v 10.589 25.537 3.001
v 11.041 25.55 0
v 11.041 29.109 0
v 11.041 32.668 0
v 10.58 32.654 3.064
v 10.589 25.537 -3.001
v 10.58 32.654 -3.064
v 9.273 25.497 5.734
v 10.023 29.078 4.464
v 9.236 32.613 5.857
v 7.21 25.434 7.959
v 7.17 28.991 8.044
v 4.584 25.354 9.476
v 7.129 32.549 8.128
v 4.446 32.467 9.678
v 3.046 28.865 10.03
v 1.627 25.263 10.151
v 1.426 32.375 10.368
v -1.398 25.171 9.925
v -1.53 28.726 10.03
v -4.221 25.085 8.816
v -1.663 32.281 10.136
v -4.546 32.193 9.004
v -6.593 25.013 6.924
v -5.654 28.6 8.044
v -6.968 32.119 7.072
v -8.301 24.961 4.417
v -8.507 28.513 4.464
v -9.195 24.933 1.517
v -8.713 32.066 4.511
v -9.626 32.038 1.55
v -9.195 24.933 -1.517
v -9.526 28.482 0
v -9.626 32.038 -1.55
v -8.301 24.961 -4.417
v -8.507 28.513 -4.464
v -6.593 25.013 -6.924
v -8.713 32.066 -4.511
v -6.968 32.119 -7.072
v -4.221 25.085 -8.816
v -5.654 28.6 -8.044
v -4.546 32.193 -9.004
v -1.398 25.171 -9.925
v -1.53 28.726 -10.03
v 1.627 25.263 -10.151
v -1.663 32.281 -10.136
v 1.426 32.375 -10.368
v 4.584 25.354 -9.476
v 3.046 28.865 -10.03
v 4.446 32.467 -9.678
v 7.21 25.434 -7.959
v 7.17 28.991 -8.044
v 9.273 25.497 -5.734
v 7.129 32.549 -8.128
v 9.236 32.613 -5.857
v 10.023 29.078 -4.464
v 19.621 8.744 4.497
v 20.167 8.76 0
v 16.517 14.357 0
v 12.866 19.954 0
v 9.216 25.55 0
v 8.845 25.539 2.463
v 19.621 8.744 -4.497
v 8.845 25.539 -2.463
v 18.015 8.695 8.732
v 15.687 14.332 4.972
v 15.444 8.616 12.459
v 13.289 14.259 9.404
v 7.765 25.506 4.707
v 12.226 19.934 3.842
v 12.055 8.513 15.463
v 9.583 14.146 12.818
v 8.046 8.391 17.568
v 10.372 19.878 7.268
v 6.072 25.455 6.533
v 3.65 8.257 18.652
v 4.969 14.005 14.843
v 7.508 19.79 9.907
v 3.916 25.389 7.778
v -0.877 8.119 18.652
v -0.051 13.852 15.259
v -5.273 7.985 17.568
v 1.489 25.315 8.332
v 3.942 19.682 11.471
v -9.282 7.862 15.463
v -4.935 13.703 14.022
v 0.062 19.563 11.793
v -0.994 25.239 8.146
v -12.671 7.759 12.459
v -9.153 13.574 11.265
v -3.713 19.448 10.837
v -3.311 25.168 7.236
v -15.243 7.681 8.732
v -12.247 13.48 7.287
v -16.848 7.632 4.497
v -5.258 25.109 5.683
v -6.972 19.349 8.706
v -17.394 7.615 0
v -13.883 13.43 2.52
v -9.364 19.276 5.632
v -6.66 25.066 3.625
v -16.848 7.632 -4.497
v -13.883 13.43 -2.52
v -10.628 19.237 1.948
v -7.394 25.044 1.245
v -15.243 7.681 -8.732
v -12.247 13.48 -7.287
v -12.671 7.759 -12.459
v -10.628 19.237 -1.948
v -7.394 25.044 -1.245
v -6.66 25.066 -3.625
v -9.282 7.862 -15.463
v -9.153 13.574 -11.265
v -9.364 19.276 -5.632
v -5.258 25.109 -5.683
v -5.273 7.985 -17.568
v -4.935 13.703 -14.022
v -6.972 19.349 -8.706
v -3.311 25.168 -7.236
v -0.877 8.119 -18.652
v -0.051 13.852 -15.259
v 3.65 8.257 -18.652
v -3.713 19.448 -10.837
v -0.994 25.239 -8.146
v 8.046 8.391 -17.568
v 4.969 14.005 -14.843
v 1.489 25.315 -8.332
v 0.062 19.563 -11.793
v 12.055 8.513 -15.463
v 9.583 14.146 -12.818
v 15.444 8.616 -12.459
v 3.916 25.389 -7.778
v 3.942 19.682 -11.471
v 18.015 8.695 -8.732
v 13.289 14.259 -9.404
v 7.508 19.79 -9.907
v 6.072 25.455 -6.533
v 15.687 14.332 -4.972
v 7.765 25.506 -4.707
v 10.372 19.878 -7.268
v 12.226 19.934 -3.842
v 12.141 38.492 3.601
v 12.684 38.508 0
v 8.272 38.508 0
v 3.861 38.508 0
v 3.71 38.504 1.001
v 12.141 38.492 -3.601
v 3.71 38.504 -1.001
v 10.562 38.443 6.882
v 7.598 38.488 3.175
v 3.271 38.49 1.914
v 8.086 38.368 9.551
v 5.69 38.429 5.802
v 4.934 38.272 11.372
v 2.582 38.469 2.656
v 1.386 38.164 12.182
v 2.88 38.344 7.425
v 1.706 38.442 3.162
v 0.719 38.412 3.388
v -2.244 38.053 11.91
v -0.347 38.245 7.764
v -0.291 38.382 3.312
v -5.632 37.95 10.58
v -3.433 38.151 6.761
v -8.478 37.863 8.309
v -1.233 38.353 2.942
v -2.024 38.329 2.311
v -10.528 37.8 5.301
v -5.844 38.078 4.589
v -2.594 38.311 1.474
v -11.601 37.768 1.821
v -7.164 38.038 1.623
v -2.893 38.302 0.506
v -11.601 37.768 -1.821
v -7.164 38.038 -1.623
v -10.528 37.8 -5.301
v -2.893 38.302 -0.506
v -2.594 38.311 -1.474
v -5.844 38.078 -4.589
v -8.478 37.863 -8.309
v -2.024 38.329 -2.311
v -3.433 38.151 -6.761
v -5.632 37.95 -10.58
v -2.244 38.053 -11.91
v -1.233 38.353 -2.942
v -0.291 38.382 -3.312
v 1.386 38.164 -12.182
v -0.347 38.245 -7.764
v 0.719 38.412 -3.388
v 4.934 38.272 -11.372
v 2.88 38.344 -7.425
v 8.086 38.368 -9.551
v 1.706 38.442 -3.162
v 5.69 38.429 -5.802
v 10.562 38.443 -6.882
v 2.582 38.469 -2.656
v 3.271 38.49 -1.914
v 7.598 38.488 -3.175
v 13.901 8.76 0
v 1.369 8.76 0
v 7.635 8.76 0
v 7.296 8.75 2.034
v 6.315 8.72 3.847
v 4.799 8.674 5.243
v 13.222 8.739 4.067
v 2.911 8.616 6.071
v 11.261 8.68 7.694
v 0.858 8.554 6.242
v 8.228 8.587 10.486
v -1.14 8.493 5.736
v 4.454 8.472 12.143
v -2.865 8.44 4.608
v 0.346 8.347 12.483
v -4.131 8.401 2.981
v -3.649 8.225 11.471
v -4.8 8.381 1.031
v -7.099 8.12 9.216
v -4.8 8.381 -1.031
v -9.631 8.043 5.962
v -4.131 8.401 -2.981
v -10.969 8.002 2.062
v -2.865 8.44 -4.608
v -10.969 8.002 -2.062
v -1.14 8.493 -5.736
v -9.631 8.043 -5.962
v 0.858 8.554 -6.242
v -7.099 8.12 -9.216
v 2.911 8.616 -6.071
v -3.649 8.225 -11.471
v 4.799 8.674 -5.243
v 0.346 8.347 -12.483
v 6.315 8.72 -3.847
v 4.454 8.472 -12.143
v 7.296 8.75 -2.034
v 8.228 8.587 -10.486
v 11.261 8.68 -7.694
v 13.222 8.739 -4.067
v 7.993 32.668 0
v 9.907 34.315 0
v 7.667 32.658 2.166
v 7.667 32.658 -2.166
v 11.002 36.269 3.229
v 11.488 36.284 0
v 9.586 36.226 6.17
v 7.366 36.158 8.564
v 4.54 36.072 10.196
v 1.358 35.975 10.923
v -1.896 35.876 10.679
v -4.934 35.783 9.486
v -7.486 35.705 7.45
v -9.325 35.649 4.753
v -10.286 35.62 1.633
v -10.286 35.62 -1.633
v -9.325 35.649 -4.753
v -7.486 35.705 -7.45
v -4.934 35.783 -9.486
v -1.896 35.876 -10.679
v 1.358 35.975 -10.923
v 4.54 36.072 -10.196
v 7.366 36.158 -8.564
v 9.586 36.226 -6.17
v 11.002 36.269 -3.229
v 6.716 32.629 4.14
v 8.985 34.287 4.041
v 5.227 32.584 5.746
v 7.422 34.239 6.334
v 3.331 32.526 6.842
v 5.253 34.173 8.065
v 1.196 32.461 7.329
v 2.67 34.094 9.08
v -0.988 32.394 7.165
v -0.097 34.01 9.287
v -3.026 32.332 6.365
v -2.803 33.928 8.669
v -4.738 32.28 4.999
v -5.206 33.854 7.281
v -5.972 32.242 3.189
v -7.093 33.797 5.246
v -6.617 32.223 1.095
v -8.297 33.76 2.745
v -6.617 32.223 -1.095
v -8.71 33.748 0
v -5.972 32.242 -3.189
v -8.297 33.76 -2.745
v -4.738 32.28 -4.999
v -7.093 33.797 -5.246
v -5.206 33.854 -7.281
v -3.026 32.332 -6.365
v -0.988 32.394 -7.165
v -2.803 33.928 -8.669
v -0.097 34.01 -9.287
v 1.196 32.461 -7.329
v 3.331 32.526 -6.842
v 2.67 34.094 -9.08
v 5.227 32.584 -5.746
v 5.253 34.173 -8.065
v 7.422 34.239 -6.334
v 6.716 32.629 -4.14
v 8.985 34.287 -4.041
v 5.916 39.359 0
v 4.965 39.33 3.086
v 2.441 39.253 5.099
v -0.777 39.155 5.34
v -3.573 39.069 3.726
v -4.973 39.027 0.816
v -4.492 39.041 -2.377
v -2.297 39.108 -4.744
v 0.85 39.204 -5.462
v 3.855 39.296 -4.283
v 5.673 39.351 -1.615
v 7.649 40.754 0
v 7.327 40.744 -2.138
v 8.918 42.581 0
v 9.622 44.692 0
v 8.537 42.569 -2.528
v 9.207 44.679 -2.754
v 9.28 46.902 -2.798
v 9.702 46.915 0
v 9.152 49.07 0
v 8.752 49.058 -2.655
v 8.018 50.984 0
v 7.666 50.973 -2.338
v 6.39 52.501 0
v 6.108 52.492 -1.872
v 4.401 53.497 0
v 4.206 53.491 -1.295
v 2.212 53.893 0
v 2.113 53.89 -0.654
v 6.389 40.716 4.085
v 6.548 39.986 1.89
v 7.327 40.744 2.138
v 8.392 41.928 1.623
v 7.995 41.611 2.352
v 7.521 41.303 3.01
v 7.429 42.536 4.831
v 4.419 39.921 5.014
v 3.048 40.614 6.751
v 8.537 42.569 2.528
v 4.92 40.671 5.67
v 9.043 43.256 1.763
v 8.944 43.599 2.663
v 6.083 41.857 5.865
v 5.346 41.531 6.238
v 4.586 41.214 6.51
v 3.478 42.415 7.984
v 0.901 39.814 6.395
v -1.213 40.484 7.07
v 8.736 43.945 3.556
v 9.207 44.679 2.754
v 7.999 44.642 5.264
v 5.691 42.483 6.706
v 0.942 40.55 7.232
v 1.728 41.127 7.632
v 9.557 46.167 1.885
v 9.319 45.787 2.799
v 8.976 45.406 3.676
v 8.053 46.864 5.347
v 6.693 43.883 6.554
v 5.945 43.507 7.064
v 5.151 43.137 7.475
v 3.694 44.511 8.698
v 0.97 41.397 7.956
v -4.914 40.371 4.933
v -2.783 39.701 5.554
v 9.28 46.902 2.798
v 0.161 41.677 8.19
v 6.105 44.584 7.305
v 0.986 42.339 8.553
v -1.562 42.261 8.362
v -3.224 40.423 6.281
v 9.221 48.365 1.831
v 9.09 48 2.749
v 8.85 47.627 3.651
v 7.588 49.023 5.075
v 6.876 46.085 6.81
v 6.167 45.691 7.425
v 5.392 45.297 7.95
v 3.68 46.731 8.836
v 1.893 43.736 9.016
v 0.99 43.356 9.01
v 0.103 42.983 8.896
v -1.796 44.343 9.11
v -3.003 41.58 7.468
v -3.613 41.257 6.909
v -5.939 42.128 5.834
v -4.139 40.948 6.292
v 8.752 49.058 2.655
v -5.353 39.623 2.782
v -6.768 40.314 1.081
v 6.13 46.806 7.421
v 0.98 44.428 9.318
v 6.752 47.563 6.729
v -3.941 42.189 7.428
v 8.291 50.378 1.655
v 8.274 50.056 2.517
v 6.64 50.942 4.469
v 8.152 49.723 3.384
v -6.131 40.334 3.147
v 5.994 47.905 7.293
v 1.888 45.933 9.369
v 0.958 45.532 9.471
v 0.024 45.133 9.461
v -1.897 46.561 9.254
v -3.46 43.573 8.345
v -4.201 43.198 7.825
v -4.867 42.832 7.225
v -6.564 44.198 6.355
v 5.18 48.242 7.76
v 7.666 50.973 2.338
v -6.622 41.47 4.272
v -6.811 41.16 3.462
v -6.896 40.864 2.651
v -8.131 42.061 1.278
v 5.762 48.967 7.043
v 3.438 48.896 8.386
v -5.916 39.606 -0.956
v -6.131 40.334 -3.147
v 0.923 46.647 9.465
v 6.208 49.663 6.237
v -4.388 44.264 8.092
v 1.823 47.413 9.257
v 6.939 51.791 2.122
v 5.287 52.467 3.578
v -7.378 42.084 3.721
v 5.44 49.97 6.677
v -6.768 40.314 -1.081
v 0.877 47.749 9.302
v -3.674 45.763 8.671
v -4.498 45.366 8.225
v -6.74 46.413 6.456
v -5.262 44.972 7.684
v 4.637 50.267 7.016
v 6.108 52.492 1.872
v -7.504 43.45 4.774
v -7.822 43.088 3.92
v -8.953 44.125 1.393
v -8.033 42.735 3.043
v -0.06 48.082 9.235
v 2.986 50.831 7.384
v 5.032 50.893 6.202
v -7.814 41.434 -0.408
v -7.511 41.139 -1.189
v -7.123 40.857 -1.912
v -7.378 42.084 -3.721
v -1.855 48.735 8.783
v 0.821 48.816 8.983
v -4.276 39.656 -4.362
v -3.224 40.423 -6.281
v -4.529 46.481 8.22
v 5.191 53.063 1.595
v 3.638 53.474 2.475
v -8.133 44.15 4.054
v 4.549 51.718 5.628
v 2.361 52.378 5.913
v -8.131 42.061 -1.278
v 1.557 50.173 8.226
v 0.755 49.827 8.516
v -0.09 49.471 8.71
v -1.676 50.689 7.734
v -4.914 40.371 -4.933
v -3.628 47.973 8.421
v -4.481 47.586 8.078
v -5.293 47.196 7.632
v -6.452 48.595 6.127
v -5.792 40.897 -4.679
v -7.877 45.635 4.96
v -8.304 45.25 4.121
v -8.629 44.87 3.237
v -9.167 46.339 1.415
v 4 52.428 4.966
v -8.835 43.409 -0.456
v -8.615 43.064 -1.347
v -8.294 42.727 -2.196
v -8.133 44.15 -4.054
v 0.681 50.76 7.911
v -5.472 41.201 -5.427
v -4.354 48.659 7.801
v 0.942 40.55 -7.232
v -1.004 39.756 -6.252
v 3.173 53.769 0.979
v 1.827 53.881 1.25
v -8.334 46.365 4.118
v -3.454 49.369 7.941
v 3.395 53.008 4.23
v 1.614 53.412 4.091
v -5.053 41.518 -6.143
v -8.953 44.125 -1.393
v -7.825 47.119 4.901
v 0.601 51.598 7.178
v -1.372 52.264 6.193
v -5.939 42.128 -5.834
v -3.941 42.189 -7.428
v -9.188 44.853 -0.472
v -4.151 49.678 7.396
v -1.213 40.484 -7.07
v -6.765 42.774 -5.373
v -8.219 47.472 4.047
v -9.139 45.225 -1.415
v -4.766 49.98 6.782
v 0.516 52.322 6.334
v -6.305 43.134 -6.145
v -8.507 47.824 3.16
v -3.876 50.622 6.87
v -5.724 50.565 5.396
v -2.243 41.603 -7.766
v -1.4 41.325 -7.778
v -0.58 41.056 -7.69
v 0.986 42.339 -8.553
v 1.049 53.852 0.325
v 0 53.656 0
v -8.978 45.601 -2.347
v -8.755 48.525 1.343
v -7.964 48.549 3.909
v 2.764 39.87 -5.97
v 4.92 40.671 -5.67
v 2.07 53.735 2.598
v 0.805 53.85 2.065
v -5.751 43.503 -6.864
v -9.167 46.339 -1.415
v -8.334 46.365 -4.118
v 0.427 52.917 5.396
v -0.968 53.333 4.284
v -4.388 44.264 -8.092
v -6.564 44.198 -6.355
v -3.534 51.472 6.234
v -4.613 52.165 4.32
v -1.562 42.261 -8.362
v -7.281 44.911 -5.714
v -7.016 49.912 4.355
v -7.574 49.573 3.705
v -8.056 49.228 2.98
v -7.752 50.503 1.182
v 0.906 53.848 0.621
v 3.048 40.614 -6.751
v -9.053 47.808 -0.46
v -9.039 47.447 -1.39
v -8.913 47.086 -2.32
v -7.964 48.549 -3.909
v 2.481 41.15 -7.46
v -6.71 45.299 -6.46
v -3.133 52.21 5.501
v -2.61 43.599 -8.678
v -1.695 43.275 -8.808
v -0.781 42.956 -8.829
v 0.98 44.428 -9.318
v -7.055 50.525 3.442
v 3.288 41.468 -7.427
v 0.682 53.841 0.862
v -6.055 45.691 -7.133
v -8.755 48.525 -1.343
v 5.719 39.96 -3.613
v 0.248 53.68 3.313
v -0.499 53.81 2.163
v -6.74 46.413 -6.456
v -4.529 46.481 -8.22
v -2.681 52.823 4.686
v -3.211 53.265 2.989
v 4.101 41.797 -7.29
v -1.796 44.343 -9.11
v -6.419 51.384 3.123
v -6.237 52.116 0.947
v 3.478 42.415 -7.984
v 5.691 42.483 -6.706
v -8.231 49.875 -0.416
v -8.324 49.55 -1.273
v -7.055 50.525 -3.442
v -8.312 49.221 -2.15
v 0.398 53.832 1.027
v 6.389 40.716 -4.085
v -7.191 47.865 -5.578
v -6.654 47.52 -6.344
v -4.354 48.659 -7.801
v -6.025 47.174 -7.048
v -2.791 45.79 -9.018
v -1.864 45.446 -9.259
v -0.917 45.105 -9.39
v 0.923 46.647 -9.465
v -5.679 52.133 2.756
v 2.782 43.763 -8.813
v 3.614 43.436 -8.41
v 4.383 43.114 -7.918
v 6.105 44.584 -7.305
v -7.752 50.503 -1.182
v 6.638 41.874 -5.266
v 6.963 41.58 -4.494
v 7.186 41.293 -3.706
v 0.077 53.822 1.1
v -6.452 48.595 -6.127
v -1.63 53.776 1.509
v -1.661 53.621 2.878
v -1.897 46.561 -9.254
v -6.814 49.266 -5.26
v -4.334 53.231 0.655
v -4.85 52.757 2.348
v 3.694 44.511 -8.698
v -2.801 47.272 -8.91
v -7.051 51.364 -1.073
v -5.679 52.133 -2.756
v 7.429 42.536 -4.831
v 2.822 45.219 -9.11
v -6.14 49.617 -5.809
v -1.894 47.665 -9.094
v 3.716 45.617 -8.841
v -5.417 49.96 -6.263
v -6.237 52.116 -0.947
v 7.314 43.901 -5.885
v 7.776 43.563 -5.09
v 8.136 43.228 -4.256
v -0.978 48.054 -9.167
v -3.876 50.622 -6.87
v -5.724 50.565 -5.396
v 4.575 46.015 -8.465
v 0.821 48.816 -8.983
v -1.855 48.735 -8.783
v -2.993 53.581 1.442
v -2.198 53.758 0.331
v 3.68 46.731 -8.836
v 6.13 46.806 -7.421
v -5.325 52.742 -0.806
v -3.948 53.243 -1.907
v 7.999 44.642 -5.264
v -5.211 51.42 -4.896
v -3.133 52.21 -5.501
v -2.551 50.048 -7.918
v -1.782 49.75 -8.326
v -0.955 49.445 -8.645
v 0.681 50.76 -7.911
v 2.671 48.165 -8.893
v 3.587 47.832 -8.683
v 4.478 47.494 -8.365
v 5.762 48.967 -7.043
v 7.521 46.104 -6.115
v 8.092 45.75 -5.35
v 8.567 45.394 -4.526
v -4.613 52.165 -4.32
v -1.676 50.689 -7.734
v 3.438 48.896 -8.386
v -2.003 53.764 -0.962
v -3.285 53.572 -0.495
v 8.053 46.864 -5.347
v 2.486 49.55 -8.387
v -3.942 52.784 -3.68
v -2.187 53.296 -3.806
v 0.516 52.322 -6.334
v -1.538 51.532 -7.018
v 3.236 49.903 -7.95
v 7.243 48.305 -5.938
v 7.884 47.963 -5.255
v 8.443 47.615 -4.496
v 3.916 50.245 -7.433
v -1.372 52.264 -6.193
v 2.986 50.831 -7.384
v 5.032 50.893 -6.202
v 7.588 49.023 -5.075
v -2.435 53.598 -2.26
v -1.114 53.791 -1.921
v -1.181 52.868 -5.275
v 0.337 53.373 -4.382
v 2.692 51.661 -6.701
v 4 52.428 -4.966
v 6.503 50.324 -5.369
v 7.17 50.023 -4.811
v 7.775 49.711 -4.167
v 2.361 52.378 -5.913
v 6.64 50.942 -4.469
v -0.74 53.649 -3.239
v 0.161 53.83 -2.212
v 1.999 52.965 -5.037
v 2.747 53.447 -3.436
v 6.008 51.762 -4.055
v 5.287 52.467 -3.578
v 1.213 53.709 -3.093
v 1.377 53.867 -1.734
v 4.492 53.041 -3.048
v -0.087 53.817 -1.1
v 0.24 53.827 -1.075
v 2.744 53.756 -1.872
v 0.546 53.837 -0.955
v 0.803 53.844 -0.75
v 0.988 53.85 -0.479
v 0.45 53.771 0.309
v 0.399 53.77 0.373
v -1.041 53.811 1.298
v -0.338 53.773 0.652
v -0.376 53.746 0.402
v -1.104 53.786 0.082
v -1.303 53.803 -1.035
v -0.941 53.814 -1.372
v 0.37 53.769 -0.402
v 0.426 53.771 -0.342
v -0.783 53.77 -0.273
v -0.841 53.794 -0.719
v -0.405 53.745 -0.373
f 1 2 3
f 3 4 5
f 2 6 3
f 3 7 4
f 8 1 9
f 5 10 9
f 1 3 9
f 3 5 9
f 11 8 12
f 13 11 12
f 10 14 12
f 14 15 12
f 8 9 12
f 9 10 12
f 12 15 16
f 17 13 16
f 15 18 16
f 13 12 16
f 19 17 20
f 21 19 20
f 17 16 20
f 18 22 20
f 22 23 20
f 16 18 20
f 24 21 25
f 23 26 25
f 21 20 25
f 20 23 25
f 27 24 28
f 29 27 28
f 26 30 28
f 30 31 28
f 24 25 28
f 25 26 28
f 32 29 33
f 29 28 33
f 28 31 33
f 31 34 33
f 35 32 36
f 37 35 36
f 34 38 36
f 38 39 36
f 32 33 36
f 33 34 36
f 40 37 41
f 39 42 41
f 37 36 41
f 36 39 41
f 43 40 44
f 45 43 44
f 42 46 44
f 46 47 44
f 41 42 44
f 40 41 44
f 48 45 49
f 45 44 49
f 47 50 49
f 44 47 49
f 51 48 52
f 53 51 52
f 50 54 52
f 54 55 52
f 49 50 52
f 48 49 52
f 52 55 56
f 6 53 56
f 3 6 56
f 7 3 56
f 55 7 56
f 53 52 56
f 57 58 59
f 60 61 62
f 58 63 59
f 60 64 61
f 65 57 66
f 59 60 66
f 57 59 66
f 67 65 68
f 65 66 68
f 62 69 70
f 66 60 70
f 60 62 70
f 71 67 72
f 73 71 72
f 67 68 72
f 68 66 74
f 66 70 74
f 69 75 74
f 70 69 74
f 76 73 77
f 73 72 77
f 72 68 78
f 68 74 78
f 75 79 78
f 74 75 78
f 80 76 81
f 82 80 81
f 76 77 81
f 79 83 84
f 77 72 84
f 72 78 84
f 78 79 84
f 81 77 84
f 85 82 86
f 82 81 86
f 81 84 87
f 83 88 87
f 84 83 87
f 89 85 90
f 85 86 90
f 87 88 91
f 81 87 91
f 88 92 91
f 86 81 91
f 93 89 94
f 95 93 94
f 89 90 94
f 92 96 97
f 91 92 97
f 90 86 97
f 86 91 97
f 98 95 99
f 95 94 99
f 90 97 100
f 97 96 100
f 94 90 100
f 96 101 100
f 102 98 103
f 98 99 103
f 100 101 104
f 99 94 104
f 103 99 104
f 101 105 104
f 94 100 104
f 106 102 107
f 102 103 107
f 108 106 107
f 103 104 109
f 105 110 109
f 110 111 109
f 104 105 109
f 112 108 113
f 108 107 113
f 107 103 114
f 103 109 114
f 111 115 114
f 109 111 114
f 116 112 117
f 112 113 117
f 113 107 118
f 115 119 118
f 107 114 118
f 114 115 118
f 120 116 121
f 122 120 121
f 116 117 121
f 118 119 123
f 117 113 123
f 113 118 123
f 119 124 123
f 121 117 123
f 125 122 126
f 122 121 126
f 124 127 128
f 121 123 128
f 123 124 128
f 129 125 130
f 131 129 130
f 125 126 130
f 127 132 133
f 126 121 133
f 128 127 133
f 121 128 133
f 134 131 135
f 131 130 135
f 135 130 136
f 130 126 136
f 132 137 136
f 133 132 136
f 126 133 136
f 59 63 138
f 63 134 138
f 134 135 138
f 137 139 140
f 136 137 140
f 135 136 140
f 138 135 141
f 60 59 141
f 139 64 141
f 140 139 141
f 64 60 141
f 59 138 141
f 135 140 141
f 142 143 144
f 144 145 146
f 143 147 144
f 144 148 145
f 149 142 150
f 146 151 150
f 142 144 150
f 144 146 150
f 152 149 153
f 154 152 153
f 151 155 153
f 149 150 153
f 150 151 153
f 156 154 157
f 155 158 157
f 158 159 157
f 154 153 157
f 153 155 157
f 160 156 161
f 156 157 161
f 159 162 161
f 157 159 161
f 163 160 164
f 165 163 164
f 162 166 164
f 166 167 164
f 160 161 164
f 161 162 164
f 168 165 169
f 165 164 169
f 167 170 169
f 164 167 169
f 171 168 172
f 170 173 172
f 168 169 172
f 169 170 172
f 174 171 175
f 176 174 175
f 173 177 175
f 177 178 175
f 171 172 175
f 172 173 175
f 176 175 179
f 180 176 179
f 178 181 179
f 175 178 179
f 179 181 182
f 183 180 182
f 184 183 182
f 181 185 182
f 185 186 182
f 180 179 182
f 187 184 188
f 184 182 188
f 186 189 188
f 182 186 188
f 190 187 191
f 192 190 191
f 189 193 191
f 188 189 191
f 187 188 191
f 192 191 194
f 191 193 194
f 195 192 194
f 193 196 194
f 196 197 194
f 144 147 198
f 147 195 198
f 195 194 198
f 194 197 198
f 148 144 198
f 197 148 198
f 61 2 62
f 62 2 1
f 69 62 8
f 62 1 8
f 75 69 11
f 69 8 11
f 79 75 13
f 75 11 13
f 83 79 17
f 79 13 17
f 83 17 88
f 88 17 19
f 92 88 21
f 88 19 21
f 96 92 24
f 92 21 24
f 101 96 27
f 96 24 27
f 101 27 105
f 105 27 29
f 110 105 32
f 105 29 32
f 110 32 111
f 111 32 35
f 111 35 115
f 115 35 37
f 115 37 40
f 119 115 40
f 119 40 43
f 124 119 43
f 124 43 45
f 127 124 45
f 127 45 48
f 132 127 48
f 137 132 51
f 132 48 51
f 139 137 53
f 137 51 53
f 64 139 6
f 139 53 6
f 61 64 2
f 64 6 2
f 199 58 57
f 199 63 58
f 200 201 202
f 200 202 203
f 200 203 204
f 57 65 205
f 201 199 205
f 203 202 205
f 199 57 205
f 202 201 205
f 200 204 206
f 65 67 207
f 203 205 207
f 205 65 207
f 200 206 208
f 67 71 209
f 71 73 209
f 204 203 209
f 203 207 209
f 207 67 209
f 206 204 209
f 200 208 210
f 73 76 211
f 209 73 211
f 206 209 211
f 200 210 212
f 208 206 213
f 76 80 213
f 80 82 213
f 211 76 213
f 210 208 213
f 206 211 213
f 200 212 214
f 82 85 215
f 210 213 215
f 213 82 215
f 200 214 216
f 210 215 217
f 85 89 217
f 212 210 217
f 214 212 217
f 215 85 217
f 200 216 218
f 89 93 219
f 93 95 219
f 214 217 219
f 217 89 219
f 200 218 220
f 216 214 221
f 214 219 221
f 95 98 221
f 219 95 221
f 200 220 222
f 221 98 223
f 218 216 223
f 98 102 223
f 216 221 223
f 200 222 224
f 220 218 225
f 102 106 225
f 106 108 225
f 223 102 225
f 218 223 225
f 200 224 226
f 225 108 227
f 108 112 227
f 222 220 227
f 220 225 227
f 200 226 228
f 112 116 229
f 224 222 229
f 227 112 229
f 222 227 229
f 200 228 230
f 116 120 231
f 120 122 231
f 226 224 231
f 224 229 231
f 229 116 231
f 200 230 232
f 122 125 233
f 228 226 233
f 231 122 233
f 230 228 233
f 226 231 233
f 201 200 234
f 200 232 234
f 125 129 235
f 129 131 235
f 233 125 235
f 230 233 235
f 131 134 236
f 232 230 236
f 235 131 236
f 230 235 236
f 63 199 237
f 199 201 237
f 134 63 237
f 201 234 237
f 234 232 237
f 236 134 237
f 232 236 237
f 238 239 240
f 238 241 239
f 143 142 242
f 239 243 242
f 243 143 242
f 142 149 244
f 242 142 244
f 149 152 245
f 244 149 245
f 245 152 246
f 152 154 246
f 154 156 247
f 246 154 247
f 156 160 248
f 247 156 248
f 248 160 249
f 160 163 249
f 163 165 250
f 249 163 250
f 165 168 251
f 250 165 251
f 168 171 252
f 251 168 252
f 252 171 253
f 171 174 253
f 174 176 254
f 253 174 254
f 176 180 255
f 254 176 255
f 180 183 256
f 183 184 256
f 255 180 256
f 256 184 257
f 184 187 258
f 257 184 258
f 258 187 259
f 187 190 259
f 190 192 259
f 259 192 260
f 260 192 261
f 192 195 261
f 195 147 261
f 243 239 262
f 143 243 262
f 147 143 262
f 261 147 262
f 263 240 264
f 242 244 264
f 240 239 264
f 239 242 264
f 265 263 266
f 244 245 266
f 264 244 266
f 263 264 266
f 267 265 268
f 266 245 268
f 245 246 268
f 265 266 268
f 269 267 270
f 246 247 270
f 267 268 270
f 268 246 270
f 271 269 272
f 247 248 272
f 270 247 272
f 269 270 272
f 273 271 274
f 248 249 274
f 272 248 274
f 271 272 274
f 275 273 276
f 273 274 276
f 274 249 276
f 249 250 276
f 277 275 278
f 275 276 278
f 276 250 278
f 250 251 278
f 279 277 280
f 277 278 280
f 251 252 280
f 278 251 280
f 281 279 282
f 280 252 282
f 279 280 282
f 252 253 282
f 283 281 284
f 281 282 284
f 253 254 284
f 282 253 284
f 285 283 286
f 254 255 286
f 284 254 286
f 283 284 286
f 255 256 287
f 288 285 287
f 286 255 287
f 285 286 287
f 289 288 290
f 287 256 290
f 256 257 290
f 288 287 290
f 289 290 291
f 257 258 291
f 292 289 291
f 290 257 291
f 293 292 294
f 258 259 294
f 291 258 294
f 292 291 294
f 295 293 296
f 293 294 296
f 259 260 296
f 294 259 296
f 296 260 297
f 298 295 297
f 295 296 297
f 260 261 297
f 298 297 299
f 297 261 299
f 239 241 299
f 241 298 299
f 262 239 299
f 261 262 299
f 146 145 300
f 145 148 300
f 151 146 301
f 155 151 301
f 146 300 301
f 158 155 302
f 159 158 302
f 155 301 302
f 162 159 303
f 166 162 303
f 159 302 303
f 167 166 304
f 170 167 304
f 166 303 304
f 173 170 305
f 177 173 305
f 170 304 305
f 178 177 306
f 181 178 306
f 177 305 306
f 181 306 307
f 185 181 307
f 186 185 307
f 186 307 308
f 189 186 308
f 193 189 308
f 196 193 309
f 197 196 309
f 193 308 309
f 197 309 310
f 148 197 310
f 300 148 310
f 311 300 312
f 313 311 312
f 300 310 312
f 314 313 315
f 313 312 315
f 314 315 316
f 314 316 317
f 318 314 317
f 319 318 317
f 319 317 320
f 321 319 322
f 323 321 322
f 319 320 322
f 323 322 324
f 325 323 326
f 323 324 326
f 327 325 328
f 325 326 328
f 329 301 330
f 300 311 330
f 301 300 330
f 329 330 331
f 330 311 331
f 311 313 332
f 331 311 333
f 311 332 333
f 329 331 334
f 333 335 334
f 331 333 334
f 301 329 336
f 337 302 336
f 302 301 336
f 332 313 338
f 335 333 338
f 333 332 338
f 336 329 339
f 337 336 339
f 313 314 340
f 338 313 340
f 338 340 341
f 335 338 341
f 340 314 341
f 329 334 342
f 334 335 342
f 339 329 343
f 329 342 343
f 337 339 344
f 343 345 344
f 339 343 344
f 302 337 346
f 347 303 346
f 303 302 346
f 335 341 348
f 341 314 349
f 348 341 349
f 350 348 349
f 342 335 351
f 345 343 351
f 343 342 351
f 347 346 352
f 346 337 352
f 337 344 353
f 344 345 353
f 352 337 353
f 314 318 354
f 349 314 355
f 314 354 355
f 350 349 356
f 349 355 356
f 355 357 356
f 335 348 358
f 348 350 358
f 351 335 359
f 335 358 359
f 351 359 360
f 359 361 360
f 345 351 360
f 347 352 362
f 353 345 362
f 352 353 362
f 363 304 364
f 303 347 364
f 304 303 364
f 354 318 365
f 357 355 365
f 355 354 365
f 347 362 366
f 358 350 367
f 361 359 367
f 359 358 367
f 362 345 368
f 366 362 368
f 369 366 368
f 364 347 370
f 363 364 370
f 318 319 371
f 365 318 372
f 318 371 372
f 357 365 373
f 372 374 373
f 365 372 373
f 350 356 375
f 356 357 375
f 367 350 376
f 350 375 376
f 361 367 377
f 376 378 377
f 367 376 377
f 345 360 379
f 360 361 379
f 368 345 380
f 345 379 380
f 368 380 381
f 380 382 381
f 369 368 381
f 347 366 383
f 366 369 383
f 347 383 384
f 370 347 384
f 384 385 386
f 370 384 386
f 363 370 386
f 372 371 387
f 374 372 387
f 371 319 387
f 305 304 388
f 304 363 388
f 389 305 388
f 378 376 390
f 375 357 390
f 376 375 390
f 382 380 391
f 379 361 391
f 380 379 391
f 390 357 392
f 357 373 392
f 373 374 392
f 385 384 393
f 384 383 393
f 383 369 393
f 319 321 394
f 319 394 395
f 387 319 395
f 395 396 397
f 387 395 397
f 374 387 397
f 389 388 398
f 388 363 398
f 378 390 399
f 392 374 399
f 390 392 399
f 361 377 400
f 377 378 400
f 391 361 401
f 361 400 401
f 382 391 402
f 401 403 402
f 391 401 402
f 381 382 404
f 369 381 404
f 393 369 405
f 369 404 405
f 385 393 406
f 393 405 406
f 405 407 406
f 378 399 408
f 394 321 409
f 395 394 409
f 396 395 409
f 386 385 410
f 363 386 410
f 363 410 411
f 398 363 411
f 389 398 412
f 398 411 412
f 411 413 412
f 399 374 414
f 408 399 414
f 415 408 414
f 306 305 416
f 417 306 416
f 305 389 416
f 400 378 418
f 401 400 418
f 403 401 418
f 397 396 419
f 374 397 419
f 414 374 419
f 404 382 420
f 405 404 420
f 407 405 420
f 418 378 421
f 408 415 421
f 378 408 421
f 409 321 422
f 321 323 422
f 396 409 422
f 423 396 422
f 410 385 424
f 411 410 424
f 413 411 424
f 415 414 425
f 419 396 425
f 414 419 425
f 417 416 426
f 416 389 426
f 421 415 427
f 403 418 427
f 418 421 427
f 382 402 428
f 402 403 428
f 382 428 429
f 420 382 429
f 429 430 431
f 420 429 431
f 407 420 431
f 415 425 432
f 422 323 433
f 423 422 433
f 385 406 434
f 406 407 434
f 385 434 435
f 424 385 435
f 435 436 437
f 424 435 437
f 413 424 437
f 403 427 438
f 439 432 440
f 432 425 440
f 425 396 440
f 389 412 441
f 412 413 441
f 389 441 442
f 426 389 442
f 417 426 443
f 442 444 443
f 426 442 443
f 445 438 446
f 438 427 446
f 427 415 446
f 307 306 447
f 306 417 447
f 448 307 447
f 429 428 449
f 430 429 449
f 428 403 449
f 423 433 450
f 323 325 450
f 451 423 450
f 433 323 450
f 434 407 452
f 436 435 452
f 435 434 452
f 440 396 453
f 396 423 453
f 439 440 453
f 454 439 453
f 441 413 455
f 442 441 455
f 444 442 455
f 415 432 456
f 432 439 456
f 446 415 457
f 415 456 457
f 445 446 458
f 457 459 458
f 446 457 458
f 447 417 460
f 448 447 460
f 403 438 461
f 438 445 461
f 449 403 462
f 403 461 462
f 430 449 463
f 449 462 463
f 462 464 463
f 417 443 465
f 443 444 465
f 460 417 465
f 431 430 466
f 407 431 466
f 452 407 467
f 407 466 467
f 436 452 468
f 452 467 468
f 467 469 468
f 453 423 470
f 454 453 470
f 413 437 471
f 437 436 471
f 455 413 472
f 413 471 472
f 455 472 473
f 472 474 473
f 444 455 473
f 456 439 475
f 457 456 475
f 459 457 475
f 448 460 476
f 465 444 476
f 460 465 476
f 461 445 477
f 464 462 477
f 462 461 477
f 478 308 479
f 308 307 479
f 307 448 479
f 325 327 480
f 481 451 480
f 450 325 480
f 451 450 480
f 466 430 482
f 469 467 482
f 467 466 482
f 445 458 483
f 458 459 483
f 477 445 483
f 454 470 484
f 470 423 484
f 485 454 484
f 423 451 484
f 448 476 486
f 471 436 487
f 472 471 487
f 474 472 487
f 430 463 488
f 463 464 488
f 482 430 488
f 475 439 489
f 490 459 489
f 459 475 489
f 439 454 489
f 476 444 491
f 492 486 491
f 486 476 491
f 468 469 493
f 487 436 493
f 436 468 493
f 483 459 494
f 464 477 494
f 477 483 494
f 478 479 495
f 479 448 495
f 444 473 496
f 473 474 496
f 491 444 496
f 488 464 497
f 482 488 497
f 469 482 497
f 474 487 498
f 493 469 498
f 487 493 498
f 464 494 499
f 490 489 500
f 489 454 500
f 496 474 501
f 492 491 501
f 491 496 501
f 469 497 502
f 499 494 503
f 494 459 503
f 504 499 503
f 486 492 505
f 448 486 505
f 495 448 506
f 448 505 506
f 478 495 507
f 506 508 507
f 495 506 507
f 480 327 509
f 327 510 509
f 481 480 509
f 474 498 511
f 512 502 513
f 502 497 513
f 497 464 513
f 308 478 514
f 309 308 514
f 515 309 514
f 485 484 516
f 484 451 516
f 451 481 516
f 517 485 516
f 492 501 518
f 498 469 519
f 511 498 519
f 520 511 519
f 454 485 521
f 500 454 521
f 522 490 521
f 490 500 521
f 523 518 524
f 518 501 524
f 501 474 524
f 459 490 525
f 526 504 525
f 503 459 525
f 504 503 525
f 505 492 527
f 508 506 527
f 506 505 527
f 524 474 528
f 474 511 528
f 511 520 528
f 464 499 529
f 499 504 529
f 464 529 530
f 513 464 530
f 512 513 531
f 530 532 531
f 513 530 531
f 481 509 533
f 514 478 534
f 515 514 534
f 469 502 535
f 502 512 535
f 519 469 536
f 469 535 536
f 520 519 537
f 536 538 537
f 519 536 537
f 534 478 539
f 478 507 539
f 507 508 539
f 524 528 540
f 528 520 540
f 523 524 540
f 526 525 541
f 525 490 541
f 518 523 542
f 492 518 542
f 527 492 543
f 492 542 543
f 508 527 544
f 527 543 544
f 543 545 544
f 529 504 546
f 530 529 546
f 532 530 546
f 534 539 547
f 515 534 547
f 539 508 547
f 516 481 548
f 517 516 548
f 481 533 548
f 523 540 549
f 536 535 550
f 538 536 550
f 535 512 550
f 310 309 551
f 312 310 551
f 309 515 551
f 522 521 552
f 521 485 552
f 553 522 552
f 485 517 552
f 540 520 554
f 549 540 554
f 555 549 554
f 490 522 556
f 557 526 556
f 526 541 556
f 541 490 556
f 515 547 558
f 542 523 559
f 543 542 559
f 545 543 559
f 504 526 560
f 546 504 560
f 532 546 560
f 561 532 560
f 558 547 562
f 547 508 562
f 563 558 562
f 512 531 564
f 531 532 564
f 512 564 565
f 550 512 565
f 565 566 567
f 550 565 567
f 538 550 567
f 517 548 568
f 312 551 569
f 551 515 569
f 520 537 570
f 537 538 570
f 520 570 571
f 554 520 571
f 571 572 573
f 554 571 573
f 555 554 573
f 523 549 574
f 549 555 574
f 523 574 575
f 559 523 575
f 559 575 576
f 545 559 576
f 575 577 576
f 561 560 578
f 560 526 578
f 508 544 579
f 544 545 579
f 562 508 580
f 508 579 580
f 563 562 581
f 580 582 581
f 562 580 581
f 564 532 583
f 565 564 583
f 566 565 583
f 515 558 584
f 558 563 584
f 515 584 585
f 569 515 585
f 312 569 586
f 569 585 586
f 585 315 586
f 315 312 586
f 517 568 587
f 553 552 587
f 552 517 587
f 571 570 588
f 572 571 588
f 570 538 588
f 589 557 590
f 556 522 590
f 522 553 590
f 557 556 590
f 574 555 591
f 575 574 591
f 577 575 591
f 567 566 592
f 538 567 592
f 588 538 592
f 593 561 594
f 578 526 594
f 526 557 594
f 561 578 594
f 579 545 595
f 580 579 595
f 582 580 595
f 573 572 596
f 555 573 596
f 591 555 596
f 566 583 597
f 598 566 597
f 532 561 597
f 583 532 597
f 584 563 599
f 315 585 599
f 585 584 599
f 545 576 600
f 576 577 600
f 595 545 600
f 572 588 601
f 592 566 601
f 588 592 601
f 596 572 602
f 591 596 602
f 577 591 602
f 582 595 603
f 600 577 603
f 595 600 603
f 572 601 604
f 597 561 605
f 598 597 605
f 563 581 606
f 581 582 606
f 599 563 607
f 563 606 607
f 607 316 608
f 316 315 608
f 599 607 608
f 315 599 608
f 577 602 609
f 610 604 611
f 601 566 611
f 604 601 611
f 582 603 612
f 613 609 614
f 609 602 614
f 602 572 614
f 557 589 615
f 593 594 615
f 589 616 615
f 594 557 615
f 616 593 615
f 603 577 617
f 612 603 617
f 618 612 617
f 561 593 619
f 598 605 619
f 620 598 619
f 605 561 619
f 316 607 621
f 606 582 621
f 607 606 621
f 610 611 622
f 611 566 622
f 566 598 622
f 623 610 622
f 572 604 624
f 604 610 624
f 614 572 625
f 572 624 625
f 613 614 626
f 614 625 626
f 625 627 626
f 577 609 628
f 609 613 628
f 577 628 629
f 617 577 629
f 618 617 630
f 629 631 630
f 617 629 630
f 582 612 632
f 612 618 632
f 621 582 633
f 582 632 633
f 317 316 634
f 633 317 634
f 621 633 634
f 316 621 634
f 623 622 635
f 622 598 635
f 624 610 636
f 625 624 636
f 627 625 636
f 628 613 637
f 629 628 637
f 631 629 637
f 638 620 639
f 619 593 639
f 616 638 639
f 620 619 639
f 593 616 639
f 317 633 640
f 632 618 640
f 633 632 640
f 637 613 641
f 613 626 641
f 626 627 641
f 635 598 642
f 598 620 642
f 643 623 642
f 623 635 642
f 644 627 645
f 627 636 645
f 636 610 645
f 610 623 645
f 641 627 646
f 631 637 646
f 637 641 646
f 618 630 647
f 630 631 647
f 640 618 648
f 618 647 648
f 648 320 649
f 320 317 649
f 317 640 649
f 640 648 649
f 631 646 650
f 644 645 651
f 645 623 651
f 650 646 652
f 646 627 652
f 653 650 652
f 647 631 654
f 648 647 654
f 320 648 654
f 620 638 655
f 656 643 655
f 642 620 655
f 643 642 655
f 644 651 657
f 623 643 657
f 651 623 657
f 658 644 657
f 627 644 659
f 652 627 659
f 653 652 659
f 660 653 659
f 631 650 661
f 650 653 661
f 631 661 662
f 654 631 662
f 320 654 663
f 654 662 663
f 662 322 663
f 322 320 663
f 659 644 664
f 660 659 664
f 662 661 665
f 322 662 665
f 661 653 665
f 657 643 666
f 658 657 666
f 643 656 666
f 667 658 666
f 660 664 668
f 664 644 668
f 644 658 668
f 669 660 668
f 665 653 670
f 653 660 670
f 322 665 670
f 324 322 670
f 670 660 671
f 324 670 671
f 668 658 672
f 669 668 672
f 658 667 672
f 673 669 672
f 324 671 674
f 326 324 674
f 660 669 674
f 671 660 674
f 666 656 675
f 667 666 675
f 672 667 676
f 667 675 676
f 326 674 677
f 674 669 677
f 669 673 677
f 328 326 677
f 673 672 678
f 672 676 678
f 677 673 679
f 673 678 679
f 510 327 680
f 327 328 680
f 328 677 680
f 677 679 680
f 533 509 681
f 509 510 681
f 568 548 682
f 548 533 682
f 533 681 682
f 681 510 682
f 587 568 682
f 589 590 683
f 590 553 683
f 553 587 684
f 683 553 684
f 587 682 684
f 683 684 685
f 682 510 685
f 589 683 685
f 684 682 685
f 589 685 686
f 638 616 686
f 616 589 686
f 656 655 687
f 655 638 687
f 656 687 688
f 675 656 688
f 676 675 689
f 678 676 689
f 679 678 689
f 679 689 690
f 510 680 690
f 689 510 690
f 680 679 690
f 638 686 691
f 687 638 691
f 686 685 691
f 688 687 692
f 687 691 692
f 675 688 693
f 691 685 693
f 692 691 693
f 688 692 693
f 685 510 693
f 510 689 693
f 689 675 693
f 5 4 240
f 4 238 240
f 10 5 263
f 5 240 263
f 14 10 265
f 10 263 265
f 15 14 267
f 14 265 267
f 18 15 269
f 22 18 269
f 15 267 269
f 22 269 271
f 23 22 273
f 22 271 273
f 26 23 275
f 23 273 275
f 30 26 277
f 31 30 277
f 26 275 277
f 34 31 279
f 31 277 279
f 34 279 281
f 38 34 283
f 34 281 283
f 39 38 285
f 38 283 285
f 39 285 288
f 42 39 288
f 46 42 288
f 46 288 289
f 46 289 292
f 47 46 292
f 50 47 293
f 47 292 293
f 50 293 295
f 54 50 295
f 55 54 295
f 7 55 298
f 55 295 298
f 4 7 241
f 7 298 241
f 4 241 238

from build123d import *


with BuildPart() as f1:
    # F0 (on Top) → F1 (revolve)
    with BuildSketch(Plane.XY):
        with BuildLine():
            Line((12.6839522272, 38.5081134737), (3.8605679486, 38.5081134737))
            ThreePointArc((3.8605679486, 38.5081134737), (9.5041549163, 48.0122683899), (0, 53.6558553576))
            Line((0, 53.6558553576), (1.3687721221, 8.7601393461))
            Line((1.3687721221, 8.7601393461), (20.1665721834, 8.7601393461))
            Line((20.1665721834, 8.7601393461), (9.2163970694, 25.5504064262))
            Line((9.2163970694, 25.5504064262), (11.0414242372, 25.5504064262))
            Line((11.0414242372, 25.5504064262), (11.0414242372, 32.6680205762))
            Line((11.0414242372, 32.6680205762), (7.9928714119, 32.6680205762))
            ThreePointArc((7.9928714119, 32.6680205762), (10.7428781159, 35.2631776582), (12.6839522272, 38.5081134737))
        make_face()
    revolve(axis=Axis((0.684386061, 31.2079973519, 0), (0.030473652, -0.9995355704, 0)))


solid = f1.part
